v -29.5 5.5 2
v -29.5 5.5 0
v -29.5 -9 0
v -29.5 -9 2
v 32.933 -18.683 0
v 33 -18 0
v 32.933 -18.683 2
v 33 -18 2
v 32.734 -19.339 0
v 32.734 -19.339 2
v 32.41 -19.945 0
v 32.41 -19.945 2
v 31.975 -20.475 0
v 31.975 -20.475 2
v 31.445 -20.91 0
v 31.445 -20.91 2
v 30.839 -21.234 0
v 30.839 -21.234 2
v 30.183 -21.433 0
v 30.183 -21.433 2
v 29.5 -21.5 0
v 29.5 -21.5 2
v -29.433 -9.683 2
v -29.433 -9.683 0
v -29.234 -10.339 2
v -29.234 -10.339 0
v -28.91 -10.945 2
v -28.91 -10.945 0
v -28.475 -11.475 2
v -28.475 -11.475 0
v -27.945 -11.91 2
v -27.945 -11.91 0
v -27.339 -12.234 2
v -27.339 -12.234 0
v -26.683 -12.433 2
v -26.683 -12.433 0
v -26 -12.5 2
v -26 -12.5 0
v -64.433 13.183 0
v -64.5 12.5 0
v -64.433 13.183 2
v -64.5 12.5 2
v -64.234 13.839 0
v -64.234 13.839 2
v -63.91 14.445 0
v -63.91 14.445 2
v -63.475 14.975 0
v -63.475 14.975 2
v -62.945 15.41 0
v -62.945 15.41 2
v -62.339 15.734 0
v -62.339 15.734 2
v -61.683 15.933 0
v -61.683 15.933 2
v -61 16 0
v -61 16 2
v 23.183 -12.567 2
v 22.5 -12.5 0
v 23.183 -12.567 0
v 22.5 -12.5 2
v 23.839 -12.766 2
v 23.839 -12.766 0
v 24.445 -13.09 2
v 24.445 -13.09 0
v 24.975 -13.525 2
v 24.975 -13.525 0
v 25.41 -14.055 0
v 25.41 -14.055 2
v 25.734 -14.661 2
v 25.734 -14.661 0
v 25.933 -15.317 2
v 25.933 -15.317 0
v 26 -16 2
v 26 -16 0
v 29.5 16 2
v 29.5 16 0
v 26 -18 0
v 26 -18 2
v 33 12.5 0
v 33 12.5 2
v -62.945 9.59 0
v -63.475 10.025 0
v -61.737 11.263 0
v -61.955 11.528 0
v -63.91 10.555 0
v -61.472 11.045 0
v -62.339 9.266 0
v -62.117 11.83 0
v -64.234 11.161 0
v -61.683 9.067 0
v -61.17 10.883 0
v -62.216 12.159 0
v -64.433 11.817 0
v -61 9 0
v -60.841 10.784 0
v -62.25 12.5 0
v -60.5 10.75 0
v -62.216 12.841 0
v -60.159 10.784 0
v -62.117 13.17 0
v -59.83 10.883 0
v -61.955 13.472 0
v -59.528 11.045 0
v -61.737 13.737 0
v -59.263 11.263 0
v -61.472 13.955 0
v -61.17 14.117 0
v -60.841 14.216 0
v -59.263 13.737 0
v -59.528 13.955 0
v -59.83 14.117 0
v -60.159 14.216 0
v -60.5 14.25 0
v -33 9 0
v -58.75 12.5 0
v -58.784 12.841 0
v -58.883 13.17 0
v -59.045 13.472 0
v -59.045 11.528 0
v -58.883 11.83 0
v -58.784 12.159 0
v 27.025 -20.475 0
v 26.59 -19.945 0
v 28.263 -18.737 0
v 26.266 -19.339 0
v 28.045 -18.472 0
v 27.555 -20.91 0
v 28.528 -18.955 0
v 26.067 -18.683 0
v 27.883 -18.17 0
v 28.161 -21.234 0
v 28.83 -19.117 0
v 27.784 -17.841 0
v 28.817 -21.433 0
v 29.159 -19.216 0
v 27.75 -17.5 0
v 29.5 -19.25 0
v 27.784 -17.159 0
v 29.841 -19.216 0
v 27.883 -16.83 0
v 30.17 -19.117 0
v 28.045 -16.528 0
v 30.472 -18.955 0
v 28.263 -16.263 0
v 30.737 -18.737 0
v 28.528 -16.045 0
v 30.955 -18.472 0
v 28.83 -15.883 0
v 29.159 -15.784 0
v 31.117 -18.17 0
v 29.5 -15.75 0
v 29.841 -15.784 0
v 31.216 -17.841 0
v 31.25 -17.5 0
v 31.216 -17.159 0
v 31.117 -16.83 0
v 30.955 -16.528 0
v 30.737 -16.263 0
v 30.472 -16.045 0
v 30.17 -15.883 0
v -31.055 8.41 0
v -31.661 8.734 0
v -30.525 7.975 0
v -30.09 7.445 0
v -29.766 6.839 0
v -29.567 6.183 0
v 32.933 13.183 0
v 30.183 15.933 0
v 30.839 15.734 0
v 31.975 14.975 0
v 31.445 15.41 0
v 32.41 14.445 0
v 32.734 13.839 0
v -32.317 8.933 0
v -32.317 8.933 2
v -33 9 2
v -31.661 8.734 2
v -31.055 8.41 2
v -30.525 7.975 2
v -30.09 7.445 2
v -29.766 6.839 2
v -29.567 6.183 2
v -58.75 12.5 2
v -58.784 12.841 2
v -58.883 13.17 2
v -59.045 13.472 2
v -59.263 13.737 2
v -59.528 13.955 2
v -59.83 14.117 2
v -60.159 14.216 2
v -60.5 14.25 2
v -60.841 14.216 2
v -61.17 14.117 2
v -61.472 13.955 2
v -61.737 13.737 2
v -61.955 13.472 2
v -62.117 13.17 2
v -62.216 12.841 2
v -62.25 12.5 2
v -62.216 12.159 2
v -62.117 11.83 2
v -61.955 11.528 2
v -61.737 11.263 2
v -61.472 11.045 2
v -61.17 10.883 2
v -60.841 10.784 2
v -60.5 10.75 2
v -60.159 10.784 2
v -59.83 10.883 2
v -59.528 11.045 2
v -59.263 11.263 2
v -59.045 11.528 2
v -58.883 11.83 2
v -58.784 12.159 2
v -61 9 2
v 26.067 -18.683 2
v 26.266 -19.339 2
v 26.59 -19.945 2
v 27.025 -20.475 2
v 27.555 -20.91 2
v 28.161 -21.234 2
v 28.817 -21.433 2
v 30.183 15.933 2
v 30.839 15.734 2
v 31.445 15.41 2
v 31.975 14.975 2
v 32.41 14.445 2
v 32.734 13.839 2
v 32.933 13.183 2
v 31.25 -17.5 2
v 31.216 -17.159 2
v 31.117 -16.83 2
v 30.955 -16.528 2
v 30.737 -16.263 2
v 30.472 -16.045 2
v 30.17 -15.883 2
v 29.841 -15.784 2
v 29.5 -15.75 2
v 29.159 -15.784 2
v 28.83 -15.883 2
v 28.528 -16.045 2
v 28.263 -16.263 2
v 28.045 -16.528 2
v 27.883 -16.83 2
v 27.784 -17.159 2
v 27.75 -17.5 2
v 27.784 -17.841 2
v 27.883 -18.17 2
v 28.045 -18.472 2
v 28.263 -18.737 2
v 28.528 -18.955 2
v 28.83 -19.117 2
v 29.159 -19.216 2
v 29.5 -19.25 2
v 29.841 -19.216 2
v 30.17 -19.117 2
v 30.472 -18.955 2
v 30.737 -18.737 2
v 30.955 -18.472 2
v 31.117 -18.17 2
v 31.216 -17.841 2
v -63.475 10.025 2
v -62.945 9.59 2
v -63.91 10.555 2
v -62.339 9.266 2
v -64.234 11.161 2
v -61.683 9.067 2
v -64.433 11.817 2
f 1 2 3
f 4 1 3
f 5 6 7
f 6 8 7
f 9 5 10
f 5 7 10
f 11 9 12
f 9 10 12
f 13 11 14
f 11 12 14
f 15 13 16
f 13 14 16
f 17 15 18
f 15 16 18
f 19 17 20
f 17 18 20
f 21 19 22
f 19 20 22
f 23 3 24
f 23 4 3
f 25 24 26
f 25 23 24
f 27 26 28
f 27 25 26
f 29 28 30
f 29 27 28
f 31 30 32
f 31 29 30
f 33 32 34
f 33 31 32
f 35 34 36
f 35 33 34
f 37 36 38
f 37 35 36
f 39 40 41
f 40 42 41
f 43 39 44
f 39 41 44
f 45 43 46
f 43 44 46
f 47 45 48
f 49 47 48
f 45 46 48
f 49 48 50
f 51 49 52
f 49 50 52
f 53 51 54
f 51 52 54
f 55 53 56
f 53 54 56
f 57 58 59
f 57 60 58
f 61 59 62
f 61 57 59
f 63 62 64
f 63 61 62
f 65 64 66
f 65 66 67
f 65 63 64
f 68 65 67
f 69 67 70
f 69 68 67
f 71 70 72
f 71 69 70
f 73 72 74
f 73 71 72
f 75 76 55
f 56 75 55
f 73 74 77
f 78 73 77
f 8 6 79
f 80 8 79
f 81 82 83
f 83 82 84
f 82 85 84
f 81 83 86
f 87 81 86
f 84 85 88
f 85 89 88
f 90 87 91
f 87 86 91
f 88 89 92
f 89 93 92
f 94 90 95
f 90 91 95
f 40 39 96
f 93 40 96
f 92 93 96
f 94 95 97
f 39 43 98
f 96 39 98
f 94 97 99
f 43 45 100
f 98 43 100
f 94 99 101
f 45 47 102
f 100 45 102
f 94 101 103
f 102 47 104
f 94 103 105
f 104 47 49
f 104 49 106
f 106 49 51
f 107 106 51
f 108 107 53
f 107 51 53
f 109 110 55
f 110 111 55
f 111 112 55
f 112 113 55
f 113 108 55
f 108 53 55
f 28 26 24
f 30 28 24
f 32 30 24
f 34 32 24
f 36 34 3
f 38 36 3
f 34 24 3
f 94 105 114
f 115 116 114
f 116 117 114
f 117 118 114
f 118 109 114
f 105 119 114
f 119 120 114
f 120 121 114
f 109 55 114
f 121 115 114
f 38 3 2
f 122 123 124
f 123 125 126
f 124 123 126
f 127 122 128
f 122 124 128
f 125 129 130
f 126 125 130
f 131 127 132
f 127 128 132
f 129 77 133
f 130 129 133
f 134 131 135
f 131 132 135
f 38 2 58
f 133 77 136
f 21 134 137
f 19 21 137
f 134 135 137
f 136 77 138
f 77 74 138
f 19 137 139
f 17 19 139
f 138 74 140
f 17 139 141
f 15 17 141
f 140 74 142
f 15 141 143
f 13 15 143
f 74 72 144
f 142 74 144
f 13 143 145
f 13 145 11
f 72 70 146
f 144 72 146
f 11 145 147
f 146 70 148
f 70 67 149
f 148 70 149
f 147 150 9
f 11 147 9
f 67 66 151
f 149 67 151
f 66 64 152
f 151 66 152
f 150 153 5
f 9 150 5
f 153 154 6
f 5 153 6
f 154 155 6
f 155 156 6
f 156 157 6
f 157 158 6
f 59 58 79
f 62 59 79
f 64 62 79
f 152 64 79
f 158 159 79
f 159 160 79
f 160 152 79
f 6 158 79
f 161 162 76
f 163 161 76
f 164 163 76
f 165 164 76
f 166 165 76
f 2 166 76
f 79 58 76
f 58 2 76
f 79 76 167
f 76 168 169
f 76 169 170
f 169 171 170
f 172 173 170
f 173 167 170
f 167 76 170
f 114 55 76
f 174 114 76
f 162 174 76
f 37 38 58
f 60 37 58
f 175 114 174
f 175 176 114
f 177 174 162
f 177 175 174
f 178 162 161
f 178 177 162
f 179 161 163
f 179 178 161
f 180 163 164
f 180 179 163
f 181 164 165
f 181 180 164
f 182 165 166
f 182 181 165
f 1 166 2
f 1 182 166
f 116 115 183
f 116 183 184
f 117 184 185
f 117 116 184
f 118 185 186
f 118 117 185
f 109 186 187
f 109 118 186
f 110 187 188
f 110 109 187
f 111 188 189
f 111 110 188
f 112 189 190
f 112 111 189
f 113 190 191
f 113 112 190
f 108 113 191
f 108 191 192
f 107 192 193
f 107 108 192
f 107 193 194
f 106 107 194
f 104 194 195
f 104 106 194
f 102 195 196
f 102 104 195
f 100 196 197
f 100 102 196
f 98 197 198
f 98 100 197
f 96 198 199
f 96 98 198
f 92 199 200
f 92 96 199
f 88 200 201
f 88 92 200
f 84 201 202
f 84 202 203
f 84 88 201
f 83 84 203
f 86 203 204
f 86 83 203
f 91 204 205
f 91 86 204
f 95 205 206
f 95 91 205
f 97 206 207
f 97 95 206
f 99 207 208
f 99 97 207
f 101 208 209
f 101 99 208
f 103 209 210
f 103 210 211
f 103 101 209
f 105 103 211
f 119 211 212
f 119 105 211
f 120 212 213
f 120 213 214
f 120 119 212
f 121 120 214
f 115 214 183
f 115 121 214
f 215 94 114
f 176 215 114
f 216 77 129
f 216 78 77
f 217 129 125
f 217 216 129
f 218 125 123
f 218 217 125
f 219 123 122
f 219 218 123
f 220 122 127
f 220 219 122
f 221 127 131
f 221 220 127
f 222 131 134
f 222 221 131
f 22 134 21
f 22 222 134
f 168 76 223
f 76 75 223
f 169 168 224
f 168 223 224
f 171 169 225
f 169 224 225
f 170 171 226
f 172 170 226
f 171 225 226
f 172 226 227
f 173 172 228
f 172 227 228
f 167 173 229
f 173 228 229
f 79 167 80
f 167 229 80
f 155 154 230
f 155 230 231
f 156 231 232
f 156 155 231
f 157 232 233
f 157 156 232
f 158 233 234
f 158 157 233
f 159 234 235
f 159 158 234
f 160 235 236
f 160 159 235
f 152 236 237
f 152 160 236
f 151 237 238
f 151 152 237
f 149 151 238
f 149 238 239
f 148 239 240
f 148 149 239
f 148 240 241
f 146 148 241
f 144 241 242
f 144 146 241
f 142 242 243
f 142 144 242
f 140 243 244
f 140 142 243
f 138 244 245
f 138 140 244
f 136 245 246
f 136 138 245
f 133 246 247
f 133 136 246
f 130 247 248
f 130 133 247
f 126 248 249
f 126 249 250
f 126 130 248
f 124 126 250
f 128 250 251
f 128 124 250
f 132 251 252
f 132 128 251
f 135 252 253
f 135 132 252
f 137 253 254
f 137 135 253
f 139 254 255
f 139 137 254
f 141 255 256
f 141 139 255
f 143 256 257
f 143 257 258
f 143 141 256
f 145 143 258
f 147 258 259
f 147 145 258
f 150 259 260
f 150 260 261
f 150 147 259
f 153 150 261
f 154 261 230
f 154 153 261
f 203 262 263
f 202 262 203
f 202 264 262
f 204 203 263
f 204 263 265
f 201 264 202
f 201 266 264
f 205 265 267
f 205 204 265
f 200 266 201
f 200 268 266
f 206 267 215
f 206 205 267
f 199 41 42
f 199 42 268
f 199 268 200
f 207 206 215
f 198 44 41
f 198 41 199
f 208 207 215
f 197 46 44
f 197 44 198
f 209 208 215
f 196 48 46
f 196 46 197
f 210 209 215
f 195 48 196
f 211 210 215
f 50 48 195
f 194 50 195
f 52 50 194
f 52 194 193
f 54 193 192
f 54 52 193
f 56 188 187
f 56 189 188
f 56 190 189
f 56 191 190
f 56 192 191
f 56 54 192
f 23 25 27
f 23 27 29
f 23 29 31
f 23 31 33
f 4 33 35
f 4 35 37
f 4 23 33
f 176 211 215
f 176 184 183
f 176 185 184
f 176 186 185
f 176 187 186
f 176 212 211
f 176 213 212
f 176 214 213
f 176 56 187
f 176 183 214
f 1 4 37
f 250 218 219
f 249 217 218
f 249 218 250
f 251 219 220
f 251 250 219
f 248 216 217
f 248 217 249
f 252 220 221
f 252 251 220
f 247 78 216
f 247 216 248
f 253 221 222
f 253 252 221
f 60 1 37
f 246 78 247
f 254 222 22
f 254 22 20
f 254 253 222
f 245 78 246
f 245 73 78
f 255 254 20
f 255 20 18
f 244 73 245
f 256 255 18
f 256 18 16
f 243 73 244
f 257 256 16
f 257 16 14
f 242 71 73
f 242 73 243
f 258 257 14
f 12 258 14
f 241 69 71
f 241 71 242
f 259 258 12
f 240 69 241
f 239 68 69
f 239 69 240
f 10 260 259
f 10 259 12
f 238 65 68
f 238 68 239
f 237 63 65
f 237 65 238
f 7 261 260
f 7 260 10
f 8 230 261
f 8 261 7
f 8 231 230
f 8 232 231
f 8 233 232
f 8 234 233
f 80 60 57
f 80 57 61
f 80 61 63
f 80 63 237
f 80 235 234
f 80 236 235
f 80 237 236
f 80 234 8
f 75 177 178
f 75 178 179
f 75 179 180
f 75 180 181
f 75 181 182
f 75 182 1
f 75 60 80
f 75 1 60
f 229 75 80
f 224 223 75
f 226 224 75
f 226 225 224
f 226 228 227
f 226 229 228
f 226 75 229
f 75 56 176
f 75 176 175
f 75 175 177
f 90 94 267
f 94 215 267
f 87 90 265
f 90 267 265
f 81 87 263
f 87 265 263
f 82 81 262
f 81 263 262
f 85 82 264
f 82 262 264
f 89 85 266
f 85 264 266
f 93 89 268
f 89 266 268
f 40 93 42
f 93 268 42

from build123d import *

# Parameters (mm, degrees)
ESQUISSE1_R        = 1.75
BOSS_EXTRU_1_DEPTH = 2
CONG_1_R           = 3.5


with BuildPart() as part:
    # Esquisse1 → Boss.-Extru.1 (new body)
    with BuildSketch(Plane.XY):
        Polygon((-64.5, 9), (-29.5, 9), (-29.5, -12.5), (26, -12.5), (26, -21.5), (33, -21.5), (33, -12.5), (33, 16), (-29.5, 16), (-64.5, 16), align=None)
        with Locations((29.5, -17.5)):
            Circle(ESQUISSE1_R, mode=Mode.SUBTRACT)
        with Locations((-60.5, 12.5)):
            Circle(ESQUISSE1_R, mode=Mode.SUBTRACT)
    extrude(amount=BOSS_EXTRU_1_DEPTH)

    # Congé1
    cong_1_edges = [part.edges().sort_by_distance(p)[0] for p in [
        (33, 16, 1),
        (26, -12.5, 1),
        (-29.5, -12.5, 1),
        (-29.5, 9, 1),
        (-64.5, 16, 1),
        (-64.5, 9, 1),
        (26, -21.5, 1),
        (33, -21.5, 1),
    ]]
    fillet(cong_1_edges, radius=CONG_1_R - 0.0001)  # a hair under: the kernel refuses the full size


solid = part.part
